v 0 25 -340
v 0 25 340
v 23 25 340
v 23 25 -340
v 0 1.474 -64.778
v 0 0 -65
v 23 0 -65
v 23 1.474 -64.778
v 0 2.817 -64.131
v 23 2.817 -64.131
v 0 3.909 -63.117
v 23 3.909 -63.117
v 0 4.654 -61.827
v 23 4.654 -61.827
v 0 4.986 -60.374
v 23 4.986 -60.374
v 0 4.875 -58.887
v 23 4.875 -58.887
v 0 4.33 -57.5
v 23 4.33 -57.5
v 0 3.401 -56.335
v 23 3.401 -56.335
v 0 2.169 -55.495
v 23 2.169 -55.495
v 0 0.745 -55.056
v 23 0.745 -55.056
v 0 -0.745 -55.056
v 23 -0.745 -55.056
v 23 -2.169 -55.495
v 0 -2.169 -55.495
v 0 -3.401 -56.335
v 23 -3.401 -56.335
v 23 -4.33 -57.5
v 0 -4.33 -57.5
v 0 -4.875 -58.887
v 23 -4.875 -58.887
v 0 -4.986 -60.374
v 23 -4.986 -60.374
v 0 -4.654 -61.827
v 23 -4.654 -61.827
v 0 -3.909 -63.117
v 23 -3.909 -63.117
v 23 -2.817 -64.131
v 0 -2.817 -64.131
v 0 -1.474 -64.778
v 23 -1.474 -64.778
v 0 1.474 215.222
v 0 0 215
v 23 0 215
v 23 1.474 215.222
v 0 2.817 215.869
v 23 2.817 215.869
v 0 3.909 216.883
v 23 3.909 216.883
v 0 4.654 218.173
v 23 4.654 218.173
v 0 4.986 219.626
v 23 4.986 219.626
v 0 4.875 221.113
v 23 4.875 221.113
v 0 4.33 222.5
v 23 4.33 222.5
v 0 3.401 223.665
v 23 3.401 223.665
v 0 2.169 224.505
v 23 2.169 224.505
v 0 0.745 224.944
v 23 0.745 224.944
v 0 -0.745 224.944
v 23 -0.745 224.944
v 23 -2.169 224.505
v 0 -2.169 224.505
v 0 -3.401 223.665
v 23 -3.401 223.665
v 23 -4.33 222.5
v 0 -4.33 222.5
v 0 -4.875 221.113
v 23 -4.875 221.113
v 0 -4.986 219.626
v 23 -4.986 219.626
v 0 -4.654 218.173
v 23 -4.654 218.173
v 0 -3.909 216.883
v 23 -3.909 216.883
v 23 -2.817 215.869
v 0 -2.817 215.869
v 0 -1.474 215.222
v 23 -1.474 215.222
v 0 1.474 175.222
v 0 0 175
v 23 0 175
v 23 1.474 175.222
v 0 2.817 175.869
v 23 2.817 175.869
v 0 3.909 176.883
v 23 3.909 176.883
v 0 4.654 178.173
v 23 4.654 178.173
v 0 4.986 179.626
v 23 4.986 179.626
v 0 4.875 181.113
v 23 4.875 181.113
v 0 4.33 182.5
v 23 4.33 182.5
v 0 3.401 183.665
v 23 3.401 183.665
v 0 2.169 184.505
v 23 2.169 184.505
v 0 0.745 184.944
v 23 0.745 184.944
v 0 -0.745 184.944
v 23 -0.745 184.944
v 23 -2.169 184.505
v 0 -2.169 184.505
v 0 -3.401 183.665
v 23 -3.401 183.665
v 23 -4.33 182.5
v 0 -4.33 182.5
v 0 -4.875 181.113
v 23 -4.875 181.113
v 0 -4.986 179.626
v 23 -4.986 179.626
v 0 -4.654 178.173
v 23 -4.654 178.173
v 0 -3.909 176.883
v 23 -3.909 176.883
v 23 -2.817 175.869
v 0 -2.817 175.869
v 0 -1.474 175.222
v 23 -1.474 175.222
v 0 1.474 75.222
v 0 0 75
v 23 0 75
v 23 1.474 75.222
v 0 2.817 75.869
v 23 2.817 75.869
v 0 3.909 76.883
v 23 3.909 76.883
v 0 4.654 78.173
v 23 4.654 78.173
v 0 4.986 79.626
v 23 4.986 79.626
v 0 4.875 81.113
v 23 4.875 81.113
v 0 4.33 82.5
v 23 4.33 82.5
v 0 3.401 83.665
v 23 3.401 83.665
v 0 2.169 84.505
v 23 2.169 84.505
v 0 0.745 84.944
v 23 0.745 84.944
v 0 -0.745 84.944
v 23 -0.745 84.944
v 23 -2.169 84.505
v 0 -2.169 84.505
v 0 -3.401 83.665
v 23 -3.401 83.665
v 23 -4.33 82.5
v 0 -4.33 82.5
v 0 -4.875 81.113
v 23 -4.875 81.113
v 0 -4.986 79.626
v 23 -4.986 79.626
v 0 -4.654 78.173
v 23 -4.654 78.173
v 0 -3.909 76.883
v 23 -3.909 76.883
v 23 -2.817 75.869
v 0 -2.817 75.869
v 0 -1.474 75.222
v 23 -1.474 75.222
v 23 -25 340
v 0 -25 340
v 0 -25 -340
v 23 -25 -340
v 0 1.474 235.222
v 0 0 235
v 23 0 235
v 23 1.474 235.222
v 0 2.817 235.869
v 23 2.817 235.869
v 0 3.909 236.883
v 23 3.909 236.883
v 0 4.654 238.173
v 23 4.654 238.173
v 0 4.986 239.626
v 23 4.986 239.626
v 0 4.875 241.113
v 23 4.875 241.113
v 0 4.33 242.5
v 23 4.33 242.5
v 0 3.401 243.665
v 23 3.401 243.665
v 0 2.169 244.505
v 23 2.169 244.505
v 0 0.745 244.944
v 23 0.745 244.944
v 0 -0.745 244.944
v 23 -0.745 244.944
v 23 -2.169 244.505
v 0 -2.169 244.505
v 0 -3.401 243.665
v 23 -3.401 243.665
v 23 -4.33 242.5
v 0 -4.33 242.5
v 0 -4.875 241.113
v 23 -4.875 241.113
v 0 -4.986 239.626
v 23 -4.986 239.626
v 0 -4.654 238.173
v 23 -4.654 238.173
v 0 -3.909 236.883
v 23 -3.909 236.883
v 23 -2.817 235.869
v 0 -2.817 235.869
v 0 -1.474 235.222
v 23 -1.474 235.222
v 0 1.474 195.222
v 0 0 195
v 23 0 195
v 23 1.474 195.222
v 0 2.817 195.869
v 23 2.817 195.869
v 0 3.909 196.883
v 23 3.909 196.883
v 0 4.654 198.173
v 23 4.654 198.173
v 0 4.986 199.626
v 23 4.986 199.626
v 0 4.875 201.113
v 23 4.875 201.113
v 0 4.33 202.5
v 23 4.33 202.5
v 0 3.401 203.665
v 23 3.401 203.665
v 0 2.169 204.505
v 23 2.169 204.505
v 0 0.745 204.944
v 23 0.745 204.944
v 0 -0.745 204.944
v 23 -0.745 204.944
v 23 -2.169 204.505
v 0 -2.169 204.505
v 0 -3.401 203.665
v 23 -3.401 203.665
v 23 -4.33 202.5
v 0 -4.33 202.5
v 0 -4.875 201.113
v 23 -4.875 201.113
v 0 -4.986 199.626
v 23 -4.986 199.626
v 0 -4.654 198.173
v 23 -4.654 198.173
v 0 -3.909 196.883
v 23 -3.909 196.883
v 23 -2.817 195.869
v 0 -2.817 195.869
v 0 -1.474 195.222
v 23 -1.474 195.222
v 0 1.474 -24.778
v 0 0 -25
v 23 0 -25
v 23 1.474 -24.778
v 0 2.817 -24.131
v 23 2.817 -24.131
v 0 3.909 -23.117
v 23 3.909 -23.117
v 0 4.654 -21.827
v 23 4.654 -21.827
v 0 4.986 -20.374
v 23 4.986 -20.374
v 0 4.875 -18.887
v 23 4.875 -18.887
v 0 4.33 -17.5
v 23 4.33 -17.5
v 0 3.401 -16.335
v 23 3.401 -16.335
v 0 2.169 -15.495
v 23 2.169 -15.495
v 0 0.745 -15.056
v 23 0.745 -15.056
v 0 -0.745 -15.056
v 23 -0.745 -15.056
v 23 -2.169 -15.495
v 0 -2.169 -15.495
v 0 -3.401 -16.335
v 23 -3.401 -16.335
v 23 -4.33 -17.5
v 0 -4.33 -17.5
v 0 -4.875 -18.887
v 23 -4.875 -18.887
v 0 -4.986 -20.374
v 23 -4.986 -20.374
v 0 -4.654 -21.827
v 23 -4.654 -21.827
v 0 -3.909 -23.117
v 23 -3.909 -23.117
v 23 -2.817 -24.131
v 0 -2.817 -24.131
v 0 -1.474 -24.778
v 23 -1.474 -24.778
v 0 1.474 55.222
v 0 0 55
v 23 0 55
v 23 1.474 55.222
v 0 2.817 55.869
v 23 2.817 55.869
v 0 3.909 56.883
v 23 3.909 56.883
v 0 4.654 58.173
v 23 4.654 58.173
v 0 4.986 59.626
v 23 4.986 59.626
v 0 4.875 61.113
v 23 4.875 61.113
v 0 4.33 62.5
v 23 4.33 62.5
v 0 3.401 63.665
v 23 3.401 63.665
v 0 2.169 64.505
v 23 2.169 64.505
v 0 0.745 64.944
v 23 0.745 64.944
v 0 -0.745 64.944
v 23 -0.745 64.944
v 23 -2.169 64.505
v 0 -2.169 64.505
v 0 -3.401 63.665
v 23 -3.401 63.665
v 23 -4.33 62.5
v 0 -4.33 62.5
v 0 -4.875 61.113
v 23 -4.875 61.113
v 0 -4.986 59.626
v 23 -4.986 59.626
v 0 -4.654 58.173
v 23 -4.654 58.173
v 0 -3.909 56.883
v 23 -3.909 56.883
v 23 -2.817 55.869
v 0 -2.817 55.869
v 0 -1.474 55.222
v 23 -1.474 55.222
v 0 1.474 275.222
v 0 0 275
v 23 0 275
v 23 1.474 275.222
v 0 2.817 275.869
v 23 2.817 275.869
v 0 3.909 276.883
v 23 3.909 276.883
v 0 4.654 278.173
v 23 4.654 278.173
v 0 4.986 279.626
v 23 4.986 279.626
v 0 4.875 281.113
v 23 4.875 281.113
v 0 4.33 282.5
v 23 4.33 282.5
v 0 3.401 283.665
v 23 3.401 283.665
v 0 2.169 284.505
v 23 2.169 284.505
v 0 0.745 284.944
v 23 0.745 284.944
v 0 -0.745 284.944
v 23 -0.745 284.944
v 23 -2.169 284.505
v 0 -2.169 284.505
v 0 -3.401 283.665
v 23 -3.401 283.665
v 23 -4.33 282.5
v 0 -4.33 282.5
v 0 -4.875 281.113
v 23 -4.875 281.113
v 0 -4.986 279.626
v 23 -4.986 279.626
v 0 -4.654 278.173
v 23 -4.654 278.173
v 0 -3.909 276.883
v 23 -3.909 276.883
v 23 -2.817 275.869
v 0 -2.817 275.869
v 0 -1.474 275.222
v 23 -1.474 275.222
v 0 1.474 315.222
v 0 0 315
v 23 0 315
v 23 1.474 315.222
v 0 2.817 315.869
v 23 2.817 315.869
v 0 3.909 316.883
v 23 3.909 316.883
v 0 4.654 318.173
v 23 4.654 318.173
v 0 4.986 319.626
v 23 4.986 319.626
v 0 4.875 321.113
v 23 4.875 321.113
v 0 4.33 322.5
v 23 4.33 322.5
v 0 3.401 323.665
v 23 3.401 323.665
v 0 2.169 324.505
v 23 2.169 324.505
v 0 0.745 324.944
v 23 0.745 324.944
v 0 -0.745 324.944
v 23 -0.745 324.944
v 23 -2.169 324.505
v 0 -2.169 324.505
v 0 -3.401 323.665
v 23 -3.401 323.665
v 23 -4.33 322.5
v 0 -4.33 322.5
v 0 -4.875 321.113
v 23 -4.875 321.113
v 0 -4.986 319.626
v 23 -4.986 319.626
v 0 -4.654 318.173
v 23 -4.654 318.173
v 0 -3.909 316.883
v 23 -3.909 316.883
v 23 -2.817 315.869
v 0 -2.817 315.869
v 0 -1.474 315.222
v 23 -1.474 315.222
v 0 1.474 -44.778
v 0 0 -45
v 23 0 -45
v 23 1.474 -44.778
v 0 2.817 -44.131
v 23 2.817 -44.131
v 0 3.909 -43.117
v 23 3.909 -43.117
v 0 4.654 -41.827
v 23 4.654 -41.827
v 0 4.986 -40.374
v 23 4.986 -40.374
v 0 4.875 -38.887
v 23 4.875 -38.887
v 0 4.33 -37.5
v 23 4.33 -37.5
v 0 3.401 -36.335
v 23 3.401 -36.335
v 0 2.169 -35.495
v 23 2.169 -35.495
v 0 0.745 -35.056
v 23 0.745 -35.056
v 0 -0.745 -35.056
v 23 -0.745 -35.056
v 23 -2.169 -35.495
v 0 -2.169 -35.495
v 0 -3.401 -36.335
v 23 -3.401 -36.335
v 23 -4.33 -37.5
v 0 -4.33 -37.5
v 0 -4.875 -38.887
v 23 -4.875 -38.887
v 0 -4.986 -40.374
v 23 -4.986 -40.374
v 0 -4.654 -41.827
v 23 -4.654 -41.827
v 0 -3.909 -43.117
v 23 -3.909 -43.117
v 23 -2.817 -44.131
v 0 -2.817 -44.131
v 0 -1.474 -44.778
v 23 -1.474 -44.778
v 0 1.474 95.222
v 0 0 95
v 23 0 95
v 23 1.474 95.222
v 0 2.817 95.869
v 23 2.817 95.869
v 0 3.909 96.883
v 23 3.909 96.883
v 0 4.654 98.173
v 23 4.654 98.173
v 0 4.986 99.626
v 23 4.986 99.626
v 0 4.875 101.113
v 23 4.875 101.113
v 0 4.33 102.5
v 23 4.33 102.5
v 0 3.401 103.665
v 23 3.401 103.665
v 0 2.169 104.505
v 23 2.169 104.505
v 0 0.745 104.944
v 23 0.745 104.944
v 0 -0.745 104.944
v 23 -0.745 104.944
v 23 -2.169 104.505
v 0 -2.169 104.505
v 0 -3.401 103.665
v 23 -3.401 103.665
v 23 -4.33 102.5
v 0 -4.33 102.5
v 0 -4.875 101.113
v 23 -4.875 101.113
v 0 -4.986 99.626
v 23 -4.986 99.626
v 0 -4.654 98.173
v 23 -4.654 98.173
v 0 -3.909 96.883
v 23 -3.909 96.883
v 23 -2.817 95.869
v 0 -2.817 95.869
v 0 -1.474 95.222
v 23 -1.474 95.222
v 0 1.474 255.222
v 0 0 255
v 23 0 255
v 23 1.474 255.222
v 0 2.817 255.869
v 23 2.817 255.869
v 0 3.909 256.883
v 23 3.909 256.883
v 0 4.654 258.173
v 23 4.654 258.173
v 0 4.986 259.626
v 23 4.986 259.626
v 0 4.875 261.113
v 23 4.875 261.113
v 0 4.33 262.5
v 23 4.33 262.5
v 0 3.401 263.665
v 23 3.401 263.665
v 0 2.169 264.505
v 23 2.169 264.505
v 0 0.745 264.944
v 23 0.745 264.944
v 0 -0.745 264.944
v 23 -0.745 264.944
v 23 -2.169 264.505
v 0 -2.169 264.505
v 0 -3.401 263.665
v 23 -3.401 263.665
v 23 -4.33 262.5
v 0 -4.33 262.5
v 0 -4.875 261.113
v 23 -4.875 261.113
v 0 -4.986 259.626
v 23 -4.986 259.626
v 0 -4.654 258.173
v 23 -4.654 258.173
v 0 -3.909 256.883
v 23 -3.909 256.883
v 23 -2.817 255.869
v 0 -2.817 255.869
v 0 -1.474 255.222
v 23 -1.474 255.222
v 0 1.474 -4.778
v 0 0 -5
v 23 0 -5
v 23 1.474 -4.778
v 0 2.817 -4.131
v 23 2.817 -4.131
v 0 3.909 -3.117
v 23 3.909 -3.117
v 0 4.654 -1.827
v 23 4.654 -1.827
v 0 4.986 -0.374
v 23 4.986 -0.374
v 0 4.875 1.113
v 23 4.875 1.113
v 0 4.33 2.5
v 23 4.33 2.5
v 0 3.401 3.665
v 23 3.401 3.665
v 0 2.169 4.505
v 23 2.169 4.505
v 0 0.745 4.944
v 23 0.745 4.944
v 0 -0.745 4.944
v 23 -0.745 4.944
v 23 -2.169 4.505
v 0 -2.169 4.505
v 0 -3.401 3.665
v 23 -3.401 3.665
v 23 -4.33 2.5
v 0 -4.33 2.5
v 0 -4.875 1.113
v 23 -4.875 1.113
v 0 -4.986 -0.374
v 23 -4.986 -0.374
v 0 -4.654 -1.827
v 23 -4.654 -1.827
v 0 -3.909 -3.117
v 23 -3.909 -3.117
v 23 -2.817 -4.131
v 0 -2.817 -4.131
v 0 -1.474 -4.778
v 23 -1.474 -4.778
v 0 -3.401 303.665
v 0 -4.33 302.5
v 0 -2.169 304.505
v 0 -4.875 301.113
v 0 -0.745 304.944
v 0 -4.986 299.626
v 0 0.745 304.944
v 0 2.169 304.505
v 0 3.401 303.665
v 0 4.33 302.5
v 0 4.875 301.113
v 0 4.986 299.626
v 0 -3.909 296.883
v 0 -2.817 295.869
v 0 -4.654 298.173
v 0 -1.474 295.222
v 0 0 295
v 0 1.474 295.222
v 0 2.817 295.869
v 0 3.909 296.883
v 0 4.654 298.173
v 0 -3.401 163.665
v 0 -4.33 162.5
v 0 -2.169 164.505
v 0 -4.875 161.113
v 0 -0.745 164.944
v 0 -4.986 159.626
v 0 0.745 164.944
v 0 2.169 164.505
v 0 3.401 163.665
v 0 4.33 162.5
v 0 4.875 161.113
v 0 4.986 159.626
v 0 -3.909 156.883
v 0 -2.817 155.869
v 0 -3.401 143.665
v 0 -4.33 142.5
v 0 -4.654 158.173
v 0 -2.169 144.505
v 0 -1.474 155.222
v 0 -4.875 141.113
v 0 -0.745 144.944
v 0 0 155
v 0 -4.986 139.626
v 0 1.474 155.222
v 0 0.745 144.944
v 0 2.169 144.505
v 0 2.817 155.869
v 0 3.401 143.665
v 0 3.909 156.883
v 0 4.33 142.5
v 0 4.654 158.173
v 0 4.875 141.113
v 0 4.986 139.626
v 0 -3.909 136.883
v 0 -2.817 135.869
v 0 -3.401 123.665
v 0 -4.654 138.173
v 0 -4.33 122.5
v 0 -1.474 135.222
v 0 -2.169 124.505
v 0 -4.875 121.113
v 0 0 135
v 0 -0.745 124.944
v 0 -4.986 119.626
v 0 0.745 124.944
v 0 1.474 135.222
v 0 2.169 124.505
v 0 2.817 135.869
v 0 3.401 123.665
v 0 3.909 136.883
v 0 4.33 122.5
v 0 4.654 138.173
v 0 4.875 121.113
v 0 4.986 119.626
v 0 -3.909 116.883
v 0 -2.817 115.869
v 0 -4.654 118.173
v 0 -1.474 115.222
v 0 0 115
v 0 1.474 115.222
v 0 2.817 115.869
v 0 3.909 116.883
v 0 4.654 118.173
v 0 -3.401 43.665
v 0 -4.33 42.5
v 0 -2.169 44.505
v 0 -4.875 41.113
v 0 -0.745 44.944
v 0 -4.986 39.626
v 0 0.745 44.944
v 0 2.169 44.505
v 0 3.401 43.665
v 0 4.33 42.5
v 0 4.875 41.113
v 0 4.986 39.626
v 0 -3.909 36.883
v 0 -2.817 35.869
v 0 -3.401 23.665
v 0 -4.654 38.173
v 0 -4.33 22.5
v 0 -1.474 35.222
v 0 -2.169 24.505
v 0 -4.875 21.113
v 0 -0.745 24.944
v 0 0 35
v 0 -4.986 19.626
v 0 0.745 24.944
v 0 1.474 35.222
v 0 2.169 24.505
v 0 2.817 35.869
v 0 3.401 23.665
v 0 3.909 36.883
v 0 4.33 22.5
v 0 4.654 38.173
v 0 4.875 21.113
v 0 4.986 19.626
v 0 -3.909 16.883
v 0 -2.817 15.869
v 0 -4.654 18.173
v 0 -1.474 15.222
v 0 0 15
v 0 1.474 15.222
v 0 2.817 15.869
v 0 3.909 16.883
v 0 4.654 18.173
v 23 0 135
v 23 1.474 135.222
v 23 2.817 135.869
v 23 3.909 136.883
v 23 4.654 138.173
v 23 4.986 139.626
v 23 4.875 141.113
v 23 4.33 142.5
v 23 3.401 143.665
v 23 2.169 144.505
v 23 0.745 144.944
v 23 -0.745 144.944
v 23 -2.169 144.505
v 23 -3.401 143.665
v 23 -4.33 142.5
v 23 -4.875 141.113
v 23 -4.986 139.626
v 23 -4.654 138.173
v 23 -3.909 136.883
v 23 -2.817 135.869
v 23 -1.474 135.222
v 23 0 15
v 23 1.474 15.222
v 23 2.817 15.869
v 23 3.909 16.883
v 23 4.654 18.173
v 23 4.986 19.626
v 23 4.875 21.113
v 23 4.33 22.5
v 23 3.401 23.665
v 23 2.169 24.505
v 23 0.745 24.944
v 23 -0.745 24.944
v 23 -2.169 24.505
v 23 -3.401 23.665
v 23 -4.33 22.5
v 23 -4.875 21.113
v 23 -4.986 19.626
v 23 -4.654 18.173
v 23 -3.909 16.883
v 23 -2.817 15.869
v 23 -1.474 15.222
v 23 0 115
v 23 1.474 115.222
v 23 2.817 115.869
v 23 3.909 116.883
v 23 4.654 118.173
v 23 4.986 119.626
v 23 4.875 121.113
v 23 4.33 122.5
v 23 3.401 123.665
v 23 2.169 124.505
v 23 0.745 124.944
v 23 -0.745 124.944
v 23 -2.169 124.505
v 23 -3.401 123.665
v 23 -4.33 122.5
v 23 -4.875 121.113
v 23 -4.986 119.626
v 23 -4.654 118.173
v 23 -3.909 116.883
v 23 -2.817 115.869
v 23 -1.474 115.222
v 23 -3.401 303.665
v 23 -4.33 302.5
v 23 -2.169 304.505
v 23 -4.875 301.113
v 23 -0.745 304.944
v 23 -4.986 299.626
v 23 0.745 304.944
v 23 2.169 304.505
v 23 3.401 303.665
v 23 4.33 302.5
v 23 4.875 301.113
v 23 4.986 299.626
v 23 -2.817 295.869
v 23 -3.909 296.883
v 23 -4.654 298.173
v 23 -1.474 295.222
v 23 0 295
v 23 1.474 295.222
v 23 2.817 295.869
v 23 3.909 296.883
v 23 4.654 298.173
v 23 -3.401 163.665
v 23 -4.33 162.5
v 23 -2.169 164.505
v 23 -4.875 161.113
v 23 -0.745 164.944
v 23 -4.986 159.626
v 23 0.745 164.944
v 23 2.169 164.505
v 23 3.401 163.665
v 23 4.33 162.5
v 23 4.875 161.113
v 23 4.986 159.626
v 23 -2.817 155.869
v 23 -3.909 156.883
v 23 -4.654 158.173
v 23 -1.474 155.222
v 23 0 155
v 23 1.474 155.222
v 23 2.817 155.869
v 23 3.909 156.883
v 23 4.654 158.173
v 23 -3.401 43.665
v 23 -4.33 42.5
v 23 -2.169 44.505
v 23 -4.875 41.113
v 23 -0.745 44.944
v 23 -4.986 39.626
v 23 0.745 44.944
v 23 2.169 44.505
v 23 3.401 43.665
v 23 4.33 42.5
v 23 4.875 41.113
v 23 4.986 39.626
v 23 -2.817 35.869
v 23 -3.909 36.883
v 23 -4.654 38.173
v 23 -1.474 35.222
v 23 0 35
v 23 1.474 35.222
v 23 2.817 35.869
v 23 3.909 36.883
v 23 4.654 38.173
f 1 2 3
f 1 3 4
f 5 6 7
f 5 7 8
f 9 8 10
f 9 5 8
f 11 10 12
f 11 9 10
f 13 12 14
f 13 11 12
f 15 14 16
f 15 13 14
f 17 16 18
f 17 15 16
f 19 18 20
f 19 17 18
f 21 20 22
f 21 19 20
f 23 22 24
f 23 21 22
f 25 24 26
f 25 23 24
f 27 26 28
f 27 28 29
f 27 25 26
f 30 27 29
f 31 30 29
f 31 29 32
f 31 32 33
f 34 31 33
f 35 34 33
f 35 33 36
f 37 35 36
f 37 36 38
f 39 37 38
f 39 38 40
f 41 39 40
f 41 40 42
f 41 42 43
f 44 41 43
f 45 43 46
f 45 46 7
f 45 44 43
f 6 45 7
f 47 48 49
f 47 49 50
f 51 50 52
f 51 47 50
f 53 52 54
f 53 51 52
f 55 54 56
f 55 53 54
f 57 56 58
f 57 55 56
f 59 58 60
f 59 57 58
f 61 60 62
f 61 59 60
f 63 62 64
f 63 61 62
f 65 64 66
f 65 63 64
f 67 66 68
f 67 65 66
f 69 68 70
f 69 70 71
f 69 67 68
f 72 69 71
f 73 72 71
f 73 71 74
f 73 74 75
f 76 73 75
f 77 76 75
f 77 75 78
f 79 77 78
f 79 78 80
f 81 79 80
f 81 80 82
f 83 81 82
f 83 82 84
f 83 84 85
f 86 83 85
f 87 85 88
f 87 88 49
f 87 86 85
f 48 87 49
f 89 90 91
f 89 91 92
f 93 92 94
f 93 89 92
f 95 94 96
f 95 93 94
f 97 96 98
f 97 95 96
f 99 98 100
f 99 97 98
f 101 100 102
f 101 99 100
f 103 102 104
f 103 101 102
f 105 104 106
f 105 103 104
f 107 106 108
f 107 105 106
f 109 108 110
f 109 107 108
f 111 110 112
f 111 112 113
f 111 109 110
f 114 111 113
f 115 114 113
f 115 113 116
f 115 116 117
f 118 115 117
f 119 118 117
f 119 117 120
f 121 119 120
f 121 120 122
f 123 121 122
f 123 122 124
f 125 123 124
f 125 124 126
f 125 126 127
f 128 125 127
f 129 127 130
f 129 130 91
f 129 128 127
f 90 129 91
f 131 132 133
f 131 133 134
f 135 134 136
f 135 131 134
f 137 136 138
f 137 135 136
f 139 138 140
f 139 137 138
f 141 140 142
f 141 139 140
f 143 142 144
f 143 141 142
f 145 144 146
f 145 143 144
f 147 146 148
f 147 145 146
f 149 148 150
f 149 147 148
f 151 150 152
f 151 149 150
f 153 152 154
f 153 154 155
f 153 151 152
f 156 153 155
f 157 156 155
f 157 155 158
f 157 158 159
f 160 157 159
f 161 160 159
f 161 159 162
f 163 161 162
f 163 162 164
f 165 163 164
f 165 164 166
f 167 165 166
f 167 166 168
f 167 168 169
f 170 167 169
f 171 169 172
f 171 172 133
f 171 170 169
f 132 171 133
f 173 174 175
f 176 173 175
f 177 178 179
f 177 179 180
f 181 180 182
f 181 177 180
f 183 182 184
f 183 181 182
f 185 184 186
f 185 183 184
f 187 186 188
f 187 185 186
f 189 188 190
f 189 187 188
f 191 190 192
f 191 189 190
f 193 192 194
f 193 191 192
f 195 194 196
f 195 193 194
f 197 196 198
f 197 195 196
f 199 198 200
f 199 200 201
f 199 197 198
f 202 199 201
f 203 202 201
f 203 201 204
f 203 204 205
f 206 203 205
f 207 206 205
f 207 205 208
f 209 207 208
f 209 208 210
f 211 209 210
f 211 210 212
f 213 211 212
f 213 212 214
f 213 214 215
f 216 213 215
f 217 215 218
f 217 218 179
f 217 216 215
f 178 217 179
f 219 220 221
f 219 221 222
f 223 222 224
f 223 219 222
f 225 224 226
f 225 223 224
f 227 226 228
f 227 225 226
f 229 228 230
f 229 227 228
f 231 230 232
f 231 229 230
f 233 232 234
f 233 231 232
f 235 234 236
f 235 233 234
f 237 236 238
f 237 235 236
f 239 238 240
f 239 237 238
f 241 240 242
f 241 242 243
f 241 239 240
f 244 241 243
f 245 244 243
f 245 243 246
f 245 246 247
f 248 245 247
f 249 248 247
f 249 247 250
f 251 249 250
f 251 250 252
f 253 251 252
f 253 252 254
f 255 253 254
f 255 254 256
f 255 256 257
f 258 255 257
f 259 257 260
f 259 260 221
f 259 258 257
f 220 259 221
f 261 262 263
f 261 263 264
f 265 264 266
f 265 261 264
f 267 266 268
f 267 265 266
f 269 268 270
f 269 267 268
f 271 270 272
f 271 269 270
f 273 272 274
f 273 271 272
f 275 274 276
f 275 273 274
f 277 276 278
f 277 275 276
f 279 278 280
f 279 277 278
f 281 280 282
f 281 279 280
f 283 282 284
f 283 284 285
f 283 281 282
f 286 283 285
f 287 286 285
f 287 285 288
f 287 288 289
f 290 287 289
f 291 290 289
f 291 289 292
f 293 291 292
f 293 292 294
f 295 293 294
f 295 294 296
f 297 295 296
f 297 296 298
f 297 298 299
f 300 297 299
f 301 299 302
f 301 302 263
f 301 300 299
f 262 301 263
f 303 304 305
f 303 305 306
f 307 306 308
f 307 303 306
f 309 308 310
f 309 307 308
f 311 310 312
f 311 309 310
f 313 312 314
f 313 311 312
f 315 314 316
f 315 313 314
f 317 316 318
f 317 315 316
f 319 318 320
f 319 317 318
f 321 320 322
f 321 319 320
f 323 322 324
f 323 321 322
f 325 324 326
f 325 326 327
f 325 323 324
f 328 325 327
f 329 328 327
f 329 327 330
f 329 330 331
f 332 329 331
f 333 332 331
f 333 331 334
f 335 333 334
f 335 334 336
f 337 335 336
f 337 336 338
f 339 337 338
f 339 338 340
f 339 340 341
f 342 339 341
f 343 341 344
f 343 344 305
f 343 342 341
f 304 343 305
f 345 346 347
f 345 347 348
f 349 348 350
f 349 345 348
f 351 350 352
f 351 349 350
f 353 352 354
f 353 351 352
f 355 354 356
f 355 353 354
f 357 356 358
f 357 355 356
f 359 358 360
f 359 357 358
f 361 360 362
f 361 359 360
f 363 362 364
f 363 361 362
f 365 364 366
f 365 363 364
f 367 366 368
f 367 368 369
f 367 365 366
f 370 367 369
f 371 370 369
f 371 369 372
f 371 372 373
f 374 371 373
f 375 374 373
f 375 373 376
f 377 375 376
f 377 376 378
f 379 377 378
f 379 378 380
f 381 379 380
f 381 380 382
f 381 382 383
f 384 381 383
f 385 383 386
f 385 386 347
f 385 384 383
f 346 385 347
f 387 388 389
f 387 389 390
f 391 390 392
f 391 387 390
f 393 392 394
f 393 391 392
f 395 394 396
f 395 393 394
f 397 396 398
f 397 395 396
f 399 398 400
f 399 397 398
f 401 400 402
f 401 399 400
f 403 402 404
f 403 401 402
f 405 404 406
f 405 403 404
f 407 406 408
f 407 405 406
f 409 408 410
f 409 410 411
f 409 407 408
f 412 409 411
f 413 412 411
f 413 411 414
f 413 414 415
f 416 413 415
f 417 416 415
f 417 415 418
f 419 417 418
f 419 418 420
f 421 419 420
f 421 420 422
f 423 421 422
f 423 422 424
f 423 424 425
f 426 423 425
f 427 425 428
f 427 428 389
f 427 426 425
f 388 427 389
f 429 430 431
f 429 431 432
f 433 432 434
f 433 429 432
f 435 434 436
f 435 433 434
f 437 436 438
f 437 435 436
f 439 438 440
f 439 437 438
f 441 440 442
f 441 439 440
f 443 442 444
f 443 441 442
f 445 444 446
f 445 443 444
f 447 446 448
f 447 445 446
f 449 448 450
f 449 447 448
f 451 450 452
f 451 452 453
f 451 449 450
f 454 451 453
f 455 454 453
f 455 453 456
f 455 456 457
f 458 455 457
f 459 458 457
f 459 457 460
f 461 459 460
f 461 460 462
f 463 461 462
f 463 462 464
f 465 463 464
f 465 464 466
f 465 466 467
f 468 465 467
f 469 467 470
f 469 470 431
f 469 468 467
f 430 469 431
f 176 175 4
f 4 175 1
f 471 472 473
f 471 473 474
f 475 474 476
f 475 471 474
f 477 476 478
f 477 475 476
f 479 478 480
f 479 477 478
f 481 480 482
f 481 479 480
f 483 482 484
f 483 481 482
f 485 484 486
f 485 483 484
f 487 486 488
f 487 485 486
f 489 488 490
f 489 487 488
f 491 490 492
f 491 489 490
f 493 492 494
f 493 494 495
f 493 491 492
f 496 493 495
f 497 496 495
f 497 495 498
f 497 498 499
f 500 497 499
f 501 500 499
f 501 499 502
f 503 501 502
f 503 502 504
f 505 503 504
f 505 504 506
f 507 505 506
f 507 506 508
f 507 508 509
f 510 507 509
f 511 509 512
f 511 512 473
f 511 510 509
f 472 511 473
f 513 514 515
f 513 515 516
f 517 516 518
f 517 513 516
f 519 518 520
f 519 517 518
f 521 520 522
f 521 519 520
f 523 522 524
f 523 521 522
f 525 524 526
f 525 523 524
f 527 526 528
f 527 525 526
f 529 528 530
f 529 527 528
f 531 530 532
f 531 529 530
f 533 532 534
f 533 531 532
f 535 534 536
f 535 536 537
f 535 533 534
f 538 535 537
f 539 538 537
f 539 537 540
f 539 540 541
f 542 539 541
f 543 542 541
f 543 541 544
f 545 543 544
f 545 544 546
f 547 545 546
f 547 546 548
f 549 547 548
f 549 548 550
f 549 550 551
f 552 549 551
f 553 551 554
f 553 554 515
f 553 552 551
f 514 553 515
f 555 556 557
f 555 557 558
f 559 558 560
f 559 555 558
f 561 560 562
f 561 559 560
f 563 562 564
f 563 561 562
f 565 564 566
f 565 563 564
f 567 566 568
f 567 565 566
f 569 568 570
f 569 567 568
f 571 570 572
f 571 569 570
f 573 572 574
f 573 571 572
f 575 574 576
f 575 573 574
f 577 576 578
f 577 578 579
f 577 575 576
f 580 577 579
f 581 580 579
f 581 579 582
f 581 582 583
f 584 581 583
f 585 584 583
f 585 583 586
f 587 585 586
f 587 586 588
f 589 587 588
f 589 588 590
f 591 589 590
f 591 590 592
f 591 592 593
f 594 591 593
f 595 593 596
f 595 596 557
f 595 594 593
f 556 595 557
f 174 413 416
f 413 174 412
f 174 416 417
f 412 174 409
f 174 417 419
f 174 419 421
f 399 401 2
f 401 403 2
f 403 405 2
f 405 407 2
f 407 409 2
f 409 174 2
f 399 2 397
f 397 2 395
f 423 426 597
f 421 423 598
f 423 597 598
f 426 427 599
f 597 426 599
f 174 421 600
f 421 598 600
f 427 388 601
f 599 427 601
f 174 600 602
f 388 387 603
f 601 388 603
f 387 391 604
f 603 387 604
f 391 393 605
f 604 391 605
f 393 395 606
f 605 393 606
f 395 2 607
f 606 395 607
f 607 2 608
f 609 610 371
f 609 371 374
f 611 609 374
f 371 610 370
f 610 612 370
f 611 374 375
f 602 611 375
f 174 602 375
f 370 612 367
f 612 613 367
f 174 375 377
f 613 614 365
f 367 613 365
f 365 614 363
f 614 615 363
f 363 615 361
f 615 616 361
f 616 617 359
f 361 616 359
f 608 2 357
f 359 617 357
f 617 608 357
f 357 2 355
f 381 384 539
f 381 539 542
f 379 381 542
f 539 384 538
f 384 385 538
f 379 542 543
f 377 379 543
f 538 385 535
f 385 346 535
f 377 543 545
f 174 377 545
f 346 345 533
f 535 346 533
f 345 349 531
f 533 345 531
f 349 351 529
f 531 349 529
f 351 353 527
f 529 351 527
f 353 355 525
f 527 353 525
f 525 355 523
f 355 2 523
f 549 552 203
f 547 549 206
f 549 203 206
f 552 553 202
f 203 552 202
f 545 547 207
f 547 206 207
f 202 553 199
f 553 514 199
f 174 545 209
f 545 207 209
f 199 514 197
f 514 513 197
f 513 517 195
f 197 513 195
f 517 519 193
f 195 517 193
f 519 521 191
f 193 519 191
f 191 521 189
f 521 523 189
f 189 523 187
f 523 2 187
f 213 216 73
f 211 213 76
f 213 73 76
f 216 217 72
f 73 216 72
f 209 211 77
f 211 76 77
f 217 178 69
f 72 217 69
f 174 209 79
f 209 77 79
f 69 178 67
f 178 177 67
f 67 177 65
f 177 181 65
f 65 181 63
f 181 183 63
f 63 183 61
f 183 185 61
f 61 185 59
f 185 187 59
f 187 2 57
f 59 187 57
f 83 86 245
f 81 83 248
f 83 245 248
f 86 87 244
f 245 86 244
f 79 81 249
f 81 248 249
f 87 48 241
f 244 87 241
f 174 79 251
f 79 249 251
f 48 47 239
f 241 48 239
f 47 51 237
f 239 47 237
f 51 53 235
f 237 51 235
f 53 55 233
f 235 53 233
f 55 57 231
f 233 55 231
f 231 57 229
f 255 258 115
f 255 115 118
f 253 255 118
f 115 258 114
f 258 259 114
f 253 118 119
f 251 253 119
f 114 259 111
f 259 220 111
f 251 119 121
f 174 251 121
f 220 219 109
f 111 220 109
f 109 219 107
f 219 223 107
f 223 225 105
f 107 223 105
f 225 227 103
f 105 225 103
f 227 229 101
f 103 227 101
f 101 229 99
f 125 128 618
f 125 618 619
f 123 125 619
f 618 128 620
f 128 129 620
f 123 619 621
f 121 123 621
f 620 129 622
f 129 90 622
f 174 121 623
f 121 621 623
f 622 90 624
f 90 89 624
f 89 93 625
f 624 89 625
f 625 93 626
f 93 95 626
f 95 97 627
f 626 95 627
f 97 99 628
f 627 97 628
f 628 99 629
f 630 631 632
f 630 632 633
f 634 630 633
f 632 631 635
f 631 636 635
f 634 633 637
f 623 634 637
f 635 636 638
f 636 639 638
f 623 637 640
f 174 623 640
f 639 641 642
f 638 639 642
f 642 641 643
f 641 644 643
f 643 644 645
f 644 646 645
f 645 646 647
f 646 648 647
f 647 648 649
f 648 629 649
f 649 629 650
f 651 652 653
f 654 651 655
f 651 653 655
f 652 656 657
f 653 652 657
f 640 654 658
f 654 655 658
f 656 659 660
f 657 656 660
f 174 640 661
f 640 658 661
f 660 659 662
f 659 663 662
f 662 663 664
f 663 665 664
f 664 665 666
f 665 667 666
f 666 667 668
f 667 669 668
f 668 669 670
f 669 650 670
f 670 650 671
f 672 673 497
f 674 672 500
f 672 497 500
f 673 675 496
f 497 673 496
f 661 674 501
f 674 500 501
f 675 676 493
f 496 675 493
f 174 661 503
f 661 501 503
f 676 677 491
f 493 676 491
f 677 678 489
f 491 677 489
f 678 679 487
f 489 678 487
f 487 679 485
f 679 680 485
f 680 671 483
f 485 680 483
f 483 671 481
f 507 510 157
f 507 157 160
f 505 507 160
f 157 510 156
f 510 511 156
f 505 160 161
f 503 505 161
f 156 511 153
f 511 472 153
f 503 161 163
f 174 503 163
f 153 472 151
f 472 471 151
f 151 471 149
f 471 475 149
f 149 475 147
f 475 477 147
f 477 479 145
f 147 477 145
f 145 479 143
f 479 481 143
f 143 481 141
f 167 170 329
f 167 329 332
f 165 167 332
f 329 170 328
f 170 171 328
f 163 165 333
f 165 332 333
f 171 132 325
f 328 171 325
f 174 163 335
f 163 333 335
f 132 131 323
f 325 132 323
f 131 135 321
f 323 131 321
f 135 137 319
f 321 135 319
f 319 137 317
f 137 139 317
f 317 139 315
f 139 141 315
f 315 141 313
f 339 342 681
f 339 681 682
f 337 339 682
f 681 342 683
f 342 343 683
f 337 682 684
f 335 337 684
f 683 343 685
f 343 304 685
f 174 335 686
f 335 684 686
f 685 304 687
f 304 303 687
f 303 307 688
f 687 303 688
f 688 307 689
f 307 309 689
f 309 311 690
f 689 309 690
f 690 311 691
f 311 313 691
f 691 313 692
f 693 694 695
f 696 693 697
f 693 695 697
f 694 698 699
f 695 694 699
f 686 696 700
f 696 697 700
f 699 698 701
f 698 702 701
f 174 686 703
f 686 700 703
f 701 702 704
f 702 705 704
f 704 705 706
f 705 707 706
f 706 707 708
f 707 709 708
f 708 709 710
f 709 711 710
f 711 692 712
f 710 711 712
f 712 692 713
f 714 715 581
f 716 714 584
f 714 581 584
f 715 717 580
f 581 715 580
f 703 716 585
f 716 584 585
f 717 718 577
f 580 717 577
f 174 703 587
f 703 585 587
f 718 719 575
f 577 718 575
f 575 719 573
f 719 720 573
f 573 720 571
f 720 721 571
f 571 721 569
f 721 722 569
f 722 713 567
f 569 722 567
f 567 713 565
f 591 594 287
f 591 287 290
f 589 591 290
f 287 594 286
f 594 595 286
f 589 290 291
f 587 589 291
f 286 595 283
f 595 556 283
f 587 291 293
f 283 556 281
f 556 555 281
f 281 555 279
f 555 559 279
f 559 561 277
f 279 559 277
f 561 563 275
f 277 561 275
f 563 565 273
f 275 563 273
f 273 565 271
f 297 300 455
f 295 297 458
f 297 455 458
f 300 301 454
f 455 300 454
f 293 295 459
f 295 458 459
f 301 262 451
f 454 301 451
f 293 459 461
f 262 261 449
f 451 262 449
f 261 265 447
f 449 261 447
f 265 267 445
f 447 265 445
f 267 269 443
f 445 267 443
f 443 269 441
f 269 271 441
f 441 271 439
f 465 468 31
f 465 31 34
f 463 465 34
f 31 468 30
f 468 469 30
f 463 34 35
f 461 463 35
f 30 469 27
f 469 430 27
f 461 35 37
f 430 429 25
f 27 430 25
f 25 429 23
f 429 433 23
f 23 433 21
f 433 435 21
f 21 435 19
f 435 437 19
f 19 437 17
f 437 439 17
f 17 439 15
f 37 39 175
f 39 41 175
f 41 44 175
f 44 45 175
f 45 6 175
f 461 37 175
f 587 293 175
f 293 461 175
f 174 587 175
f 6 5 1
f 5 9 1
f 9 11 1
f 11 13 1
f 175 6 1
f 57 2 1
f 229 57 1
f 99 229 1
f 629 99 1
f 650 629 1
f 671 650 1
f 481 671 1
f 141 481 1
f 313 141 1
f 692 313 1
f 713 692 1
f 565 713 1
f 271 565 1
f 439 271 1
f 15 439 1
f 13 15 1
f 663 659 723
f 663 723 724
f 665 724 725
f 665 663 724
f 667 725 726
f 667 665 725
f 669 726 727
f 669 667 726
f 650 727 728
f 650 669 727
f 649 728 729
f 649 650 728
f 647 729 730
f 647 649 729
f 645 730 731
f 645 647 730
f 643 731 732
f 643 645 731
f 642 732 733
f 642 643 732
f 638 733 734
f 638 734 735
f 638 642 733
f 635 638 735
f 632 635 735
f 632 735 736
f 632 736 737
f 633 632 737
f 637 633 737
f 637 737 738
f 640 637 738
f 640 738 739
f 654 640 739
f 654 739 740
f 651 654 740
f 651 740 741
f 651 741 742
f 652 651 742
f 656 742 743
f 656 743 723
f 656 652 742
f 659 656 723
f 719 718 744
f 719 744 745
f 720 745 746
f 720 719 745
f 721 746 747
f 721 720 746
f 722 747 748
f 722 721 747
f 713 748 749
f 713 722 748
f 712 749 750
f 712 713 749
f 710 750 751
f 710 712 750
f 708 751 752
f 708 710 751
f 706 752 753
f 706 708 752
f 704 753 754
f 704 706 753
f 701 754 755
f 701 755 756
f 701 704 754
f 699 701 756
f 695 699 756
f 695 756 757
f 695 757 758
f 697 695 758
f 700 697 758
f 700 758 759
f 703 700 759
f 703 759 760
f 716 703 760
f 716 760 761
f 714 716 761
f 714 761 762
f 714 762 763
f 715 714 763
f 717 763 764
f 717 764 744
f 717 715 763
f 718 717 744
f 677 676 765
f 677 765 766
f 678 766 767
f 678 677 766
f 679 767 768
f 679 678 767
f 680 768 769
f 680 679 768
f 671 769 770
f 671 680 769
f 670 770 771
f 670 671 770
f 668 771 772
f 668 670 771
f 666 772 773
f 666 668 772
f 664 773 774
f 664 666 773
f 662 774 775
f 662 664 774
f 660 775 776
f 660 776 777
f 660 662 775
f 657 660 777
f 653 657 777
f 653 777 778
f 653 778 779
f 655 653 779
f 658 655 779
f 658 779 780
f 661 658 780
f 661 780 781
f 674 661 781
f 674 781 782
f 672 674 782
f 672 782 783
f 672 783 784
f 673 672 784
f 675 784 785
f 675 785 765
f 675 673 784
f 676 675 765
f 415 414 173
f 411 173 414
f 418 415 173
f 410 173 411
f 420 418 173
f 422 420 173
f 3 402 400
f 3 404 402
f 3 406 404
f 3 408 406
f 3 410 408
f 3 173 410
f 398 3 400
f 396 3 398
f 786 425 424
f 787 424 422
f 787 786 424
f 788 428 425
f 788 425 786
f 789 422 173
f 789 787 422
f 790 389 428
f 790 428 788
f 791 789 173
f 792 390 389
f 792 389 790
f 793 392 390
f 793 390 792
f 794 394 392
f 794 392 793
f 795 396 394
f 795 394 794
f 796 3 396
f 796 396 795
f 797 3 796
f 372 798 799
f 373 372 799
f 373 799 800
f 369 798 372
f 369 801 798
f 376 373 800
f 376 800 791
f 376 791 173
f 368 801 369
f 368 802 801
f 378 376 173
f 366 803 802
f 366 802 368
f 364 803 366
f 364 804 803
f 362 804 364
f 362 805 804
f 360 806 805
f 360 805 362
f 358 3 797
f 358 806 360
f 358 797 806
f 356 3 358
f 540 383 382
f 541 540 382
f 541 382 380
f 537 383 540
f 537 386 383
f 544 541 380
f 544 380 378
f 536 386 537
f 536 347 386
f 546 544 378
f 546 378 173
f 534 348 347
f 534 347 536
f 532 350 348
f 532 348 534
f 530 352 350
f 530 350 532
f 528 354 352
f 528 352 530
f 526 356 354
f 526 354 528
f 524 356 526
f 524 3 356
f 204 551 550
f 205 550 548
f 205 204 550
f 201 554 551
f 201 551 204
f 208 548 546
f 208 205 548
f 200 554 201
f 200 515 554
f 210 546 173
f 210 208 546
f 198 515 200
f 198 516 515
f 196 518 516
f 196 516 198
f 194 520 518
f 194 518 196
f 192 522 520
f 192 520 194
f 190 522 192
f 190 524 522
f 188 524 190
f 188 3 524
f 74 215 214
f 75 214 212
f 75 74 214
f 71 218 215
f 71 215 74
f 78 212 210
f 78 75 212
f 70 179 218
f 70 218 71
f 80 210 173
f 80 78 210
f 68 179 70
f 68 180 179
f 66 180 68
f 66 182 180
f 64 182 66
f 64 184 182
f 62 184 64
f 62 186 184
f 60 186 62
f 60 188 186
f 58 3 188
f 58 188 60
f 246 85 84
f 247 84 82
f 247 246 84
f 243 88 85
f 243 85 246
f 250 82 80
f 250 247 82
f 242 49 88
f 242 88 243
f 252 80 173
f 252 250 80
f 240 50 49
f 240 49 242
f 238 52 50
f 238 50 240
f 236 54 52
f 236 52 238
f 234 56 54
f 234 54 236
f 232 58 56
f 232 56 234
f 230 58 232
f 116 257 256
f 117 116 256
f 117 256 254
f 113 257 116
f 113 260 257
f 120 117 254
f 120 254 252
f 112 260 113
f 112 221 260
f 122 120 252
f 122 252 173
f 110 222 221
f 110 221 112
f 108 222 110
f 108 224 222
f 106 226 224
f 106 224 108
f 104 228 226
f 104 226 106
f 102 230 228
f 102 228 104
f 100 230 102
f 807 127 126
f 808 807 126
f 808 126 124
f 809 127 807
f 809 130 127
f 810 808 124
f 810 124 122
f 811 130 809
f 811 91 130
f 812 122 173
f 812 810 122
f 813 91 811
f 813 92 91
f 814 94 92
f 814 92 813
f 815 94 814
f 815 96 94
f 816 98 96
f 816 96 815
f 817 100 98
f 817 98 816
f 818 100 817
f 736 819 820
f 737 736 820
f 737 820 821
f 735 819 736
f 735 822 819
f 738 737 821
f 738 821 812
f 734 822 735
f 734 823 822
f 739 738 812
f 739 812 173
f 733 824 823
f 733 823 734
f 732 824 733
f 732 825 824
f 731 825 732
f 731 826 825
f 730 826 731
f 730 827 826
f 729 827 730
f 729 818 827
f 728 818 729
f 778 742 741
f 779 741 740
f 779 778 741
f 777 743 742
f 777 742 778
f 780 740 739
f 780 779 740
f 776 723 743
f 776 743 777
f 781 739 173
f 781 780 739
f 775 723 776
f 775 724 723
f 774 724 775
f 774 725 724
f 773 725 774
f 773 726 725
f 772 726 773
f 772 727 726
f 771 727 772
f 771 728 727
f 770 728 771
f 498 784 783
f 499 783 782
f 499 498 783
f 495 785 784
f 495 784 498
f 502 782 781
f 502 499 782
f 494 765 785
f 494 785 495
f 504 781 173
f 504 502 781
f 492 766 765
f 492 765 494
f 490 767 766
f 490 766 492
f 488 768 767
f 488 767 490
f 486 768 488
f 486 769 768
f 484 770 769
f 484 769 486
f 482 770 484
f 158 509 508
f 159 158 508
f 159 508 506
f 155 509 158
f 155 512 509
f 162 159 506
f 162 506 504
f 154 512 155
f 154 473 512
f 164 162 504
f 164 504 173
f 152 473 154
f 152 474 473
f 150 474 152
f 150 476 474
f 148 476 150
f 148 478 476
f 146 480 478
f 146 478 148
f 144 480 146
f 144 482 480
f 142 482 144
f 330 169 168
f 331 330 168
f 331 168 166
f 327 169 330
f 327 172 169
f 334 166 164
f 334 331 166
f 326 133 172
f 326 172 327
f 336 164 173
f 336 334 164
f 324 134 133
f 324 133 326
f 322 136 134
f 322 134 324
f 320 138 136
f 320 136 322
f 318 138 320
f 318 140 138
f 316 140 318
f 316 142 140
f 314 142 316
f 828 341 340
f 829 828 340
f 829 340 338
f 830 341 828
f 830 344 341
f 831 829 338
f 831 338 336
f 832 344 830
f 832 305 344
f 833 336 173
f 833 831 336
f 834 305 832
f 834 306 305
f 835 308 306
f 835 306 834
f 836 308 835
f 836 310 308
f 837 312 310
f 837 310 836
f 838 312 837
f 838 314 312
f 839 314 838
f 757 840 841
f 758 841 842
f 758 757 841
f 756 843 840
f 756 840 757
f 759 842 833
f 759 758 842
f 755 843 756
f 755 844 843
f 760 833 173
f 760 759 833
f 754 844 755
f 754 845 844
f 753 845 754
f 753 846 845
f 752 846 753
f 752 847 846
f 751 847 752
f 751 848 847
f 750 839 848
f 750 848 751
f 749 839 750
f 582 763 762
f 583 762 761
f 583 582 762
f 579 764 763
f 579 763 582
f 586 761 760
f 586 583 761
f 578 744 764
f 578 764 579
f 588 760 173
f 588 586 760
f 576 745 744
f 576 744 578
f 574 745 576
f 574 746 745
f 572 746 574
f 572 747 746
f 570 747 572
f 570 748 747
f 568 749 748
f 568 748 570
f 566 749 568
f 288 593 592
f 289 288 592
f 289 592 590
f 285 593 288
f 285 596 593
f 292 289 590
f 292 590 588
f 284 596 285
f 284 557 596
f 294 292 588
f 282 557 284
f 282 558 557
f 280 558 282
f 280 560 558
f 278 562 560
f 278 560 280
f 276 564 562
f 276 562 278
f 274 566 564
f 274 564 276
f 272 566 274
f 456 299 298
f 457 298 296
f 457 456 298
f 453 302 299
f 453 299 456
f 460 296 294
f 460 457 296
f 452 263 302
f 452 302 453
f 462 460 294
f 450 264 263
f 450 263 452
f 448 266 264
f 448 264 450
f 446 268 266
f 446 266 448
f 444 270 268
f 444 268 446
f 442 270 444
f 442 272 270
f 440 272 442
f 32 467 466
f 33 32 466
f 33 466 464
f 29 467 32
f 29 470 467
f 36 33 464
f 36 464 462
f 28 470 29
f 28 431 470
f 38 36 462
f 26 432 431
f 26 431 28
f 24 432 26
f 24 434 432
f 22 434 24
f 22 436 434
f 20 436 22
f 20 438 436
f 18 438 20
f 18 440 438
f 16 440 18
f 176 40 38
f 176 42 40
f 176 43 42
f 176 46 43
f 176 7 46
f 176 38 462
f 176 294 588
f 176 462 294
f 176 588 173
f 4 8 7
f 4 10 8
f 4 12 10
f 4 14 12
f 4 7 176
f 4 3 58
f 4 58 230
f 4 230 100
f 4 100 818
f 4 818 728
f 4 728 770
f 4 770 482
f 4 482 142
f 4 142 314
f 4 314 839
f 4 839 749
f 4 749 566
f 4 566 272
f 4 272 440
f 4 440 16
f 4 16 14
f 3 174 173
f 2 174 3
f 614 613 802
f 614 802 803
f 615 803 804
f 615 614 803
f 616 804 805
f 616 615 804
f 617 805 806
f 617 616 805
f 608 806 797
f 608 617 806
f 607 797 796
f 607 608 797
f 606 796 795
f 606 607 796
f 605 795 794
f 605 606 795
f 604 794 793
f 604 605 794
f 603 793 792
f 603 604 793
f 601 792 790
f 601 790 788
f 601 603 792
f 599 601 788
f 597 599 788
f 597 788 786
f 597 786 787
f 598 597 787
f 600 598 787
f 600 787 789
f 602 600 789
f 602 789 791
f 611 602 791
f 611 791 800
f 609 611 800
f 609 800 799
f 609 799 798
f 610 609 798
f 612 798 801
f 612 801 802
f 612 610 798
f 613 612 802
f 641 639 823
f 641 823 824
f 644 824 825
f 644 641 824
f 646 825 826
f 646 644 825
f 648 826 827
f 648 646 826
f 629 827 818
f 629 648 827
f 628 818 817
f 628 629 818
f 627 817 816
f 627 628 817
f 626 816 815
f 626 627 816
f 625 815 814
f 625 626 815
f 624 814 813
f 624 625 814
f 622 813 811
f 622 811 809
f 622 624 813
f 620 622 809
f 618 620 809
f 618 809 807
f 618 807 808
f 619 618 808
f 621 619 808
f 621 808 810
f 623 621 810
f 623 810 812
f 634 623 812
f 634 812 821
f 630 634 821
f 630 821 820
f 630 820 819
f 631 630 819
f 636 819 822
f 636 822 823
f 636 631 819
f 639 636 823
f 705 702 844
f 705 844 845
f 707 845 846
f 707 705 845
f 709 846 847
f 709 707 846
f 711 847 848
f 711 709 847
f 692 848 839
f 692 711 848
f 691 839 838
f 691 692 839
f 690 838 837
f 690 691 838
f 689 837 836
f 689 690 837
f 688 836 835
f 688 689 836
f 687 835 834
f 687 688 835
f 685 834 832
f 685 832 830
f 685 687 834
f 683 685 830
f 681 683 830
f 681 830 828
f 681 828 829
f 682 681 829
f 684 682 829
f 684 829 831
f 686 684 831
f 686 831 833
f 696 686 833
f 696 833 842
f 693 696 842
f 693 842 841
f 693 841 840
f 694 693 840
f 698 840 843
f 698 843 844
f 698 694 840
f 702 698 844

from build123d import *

# Parameters (mm, degrees)
SKETCH1_W           = 680
SKETCH1_H           = 50
SKETCH1_R           = 5
BOSS_EXTRUDE1_DEPTH = 23


with BuildPart() as part:
    # Sketch1 → Boss-Extrude1 (new body)
    with BuildSketch(Plane(origin=(0, 0, 0), x_dir=(0, 0, -1), z_dir=(1, 0, 0))):
        Rectangle(SKETCH1_W, SKETCH1_H)
        with Locations((-320, 0)):
            Circle(SKETCH1_R, mode=Mode.SUBTRACT)
        with Locations((-300, 0)):
            Circle(SKETCH1_R, mode=Mode.SUBTRACT)
        with Locations((-280, 0)):
            Circle(SKETCH1_R, mode=Mode.SUBTRACT)
        with Locations((-260, 0)):
            Circle(SKETCH1_R, mode=Mode.SUBTRACT)
        with Locations((-240, 0)):
            Circle(SKETCH1_R, mode=Mode.SUBTRACT)
        with Locations((-220, 0)):
            Circle(SKETCH1_R, mode=Mode.SUBTRACT)
        with Locations((-200, 0)):
            Circle(SKETCH1_R, mode=Mode.SUBTRACT)
        with Locations((-180, 0)):
            Circle(SKETCH1_R, mode=Mode.SUBTRACT)
        with Locations((-160, 0)):
            Circle(SKETCH1_R, mode=Mode.SUBTRACT)
        with Locations((-140, 0)):
            Circle(SKETCH1_R, mode=Mode.SUBTRACT)
        with Locations((-120, 0)):
            Circle(SKETCH1_R, mode=Mode.SUBTRACT)
        with Locations((-100, 0)):
            Circle(SKETCH1_R, mode=Mode.SUBTRACT)
        with Locations((-80, 0)):
            Circle(SKETCH1_R, mode=Mode.SUBTRACT)
        with Locations((-60, 0)):
            Circle(SKETCH1_R, mode=Mode.SUBTRACT)
        with Locations((-40, 0)):
            Circle(SKETCH1_R, mode=Mode.SUBTRACT)
        with Locations((-20, 0)):
            Circle(SKETCH1_R, mode=Mode.SUBTRACT)
        Circle(SKETCH1_R, mode=Mode.SUBTRACT)
        with Locations((20, 0)):
            Circle(SKETCH1_R, mode=Mode.SUBTRACT)
        with Locations((40, 0)):
            Circle(SKETCH1_R, mode=Mode.SUBTRACT)
        with Locations((60, 0)):
            Circle(SKETCH1_R, mode=Mode.SUBTRACT)
    extrude(amount=BOSS_EXTRUDE1_DEPTH)


solid = part.part
